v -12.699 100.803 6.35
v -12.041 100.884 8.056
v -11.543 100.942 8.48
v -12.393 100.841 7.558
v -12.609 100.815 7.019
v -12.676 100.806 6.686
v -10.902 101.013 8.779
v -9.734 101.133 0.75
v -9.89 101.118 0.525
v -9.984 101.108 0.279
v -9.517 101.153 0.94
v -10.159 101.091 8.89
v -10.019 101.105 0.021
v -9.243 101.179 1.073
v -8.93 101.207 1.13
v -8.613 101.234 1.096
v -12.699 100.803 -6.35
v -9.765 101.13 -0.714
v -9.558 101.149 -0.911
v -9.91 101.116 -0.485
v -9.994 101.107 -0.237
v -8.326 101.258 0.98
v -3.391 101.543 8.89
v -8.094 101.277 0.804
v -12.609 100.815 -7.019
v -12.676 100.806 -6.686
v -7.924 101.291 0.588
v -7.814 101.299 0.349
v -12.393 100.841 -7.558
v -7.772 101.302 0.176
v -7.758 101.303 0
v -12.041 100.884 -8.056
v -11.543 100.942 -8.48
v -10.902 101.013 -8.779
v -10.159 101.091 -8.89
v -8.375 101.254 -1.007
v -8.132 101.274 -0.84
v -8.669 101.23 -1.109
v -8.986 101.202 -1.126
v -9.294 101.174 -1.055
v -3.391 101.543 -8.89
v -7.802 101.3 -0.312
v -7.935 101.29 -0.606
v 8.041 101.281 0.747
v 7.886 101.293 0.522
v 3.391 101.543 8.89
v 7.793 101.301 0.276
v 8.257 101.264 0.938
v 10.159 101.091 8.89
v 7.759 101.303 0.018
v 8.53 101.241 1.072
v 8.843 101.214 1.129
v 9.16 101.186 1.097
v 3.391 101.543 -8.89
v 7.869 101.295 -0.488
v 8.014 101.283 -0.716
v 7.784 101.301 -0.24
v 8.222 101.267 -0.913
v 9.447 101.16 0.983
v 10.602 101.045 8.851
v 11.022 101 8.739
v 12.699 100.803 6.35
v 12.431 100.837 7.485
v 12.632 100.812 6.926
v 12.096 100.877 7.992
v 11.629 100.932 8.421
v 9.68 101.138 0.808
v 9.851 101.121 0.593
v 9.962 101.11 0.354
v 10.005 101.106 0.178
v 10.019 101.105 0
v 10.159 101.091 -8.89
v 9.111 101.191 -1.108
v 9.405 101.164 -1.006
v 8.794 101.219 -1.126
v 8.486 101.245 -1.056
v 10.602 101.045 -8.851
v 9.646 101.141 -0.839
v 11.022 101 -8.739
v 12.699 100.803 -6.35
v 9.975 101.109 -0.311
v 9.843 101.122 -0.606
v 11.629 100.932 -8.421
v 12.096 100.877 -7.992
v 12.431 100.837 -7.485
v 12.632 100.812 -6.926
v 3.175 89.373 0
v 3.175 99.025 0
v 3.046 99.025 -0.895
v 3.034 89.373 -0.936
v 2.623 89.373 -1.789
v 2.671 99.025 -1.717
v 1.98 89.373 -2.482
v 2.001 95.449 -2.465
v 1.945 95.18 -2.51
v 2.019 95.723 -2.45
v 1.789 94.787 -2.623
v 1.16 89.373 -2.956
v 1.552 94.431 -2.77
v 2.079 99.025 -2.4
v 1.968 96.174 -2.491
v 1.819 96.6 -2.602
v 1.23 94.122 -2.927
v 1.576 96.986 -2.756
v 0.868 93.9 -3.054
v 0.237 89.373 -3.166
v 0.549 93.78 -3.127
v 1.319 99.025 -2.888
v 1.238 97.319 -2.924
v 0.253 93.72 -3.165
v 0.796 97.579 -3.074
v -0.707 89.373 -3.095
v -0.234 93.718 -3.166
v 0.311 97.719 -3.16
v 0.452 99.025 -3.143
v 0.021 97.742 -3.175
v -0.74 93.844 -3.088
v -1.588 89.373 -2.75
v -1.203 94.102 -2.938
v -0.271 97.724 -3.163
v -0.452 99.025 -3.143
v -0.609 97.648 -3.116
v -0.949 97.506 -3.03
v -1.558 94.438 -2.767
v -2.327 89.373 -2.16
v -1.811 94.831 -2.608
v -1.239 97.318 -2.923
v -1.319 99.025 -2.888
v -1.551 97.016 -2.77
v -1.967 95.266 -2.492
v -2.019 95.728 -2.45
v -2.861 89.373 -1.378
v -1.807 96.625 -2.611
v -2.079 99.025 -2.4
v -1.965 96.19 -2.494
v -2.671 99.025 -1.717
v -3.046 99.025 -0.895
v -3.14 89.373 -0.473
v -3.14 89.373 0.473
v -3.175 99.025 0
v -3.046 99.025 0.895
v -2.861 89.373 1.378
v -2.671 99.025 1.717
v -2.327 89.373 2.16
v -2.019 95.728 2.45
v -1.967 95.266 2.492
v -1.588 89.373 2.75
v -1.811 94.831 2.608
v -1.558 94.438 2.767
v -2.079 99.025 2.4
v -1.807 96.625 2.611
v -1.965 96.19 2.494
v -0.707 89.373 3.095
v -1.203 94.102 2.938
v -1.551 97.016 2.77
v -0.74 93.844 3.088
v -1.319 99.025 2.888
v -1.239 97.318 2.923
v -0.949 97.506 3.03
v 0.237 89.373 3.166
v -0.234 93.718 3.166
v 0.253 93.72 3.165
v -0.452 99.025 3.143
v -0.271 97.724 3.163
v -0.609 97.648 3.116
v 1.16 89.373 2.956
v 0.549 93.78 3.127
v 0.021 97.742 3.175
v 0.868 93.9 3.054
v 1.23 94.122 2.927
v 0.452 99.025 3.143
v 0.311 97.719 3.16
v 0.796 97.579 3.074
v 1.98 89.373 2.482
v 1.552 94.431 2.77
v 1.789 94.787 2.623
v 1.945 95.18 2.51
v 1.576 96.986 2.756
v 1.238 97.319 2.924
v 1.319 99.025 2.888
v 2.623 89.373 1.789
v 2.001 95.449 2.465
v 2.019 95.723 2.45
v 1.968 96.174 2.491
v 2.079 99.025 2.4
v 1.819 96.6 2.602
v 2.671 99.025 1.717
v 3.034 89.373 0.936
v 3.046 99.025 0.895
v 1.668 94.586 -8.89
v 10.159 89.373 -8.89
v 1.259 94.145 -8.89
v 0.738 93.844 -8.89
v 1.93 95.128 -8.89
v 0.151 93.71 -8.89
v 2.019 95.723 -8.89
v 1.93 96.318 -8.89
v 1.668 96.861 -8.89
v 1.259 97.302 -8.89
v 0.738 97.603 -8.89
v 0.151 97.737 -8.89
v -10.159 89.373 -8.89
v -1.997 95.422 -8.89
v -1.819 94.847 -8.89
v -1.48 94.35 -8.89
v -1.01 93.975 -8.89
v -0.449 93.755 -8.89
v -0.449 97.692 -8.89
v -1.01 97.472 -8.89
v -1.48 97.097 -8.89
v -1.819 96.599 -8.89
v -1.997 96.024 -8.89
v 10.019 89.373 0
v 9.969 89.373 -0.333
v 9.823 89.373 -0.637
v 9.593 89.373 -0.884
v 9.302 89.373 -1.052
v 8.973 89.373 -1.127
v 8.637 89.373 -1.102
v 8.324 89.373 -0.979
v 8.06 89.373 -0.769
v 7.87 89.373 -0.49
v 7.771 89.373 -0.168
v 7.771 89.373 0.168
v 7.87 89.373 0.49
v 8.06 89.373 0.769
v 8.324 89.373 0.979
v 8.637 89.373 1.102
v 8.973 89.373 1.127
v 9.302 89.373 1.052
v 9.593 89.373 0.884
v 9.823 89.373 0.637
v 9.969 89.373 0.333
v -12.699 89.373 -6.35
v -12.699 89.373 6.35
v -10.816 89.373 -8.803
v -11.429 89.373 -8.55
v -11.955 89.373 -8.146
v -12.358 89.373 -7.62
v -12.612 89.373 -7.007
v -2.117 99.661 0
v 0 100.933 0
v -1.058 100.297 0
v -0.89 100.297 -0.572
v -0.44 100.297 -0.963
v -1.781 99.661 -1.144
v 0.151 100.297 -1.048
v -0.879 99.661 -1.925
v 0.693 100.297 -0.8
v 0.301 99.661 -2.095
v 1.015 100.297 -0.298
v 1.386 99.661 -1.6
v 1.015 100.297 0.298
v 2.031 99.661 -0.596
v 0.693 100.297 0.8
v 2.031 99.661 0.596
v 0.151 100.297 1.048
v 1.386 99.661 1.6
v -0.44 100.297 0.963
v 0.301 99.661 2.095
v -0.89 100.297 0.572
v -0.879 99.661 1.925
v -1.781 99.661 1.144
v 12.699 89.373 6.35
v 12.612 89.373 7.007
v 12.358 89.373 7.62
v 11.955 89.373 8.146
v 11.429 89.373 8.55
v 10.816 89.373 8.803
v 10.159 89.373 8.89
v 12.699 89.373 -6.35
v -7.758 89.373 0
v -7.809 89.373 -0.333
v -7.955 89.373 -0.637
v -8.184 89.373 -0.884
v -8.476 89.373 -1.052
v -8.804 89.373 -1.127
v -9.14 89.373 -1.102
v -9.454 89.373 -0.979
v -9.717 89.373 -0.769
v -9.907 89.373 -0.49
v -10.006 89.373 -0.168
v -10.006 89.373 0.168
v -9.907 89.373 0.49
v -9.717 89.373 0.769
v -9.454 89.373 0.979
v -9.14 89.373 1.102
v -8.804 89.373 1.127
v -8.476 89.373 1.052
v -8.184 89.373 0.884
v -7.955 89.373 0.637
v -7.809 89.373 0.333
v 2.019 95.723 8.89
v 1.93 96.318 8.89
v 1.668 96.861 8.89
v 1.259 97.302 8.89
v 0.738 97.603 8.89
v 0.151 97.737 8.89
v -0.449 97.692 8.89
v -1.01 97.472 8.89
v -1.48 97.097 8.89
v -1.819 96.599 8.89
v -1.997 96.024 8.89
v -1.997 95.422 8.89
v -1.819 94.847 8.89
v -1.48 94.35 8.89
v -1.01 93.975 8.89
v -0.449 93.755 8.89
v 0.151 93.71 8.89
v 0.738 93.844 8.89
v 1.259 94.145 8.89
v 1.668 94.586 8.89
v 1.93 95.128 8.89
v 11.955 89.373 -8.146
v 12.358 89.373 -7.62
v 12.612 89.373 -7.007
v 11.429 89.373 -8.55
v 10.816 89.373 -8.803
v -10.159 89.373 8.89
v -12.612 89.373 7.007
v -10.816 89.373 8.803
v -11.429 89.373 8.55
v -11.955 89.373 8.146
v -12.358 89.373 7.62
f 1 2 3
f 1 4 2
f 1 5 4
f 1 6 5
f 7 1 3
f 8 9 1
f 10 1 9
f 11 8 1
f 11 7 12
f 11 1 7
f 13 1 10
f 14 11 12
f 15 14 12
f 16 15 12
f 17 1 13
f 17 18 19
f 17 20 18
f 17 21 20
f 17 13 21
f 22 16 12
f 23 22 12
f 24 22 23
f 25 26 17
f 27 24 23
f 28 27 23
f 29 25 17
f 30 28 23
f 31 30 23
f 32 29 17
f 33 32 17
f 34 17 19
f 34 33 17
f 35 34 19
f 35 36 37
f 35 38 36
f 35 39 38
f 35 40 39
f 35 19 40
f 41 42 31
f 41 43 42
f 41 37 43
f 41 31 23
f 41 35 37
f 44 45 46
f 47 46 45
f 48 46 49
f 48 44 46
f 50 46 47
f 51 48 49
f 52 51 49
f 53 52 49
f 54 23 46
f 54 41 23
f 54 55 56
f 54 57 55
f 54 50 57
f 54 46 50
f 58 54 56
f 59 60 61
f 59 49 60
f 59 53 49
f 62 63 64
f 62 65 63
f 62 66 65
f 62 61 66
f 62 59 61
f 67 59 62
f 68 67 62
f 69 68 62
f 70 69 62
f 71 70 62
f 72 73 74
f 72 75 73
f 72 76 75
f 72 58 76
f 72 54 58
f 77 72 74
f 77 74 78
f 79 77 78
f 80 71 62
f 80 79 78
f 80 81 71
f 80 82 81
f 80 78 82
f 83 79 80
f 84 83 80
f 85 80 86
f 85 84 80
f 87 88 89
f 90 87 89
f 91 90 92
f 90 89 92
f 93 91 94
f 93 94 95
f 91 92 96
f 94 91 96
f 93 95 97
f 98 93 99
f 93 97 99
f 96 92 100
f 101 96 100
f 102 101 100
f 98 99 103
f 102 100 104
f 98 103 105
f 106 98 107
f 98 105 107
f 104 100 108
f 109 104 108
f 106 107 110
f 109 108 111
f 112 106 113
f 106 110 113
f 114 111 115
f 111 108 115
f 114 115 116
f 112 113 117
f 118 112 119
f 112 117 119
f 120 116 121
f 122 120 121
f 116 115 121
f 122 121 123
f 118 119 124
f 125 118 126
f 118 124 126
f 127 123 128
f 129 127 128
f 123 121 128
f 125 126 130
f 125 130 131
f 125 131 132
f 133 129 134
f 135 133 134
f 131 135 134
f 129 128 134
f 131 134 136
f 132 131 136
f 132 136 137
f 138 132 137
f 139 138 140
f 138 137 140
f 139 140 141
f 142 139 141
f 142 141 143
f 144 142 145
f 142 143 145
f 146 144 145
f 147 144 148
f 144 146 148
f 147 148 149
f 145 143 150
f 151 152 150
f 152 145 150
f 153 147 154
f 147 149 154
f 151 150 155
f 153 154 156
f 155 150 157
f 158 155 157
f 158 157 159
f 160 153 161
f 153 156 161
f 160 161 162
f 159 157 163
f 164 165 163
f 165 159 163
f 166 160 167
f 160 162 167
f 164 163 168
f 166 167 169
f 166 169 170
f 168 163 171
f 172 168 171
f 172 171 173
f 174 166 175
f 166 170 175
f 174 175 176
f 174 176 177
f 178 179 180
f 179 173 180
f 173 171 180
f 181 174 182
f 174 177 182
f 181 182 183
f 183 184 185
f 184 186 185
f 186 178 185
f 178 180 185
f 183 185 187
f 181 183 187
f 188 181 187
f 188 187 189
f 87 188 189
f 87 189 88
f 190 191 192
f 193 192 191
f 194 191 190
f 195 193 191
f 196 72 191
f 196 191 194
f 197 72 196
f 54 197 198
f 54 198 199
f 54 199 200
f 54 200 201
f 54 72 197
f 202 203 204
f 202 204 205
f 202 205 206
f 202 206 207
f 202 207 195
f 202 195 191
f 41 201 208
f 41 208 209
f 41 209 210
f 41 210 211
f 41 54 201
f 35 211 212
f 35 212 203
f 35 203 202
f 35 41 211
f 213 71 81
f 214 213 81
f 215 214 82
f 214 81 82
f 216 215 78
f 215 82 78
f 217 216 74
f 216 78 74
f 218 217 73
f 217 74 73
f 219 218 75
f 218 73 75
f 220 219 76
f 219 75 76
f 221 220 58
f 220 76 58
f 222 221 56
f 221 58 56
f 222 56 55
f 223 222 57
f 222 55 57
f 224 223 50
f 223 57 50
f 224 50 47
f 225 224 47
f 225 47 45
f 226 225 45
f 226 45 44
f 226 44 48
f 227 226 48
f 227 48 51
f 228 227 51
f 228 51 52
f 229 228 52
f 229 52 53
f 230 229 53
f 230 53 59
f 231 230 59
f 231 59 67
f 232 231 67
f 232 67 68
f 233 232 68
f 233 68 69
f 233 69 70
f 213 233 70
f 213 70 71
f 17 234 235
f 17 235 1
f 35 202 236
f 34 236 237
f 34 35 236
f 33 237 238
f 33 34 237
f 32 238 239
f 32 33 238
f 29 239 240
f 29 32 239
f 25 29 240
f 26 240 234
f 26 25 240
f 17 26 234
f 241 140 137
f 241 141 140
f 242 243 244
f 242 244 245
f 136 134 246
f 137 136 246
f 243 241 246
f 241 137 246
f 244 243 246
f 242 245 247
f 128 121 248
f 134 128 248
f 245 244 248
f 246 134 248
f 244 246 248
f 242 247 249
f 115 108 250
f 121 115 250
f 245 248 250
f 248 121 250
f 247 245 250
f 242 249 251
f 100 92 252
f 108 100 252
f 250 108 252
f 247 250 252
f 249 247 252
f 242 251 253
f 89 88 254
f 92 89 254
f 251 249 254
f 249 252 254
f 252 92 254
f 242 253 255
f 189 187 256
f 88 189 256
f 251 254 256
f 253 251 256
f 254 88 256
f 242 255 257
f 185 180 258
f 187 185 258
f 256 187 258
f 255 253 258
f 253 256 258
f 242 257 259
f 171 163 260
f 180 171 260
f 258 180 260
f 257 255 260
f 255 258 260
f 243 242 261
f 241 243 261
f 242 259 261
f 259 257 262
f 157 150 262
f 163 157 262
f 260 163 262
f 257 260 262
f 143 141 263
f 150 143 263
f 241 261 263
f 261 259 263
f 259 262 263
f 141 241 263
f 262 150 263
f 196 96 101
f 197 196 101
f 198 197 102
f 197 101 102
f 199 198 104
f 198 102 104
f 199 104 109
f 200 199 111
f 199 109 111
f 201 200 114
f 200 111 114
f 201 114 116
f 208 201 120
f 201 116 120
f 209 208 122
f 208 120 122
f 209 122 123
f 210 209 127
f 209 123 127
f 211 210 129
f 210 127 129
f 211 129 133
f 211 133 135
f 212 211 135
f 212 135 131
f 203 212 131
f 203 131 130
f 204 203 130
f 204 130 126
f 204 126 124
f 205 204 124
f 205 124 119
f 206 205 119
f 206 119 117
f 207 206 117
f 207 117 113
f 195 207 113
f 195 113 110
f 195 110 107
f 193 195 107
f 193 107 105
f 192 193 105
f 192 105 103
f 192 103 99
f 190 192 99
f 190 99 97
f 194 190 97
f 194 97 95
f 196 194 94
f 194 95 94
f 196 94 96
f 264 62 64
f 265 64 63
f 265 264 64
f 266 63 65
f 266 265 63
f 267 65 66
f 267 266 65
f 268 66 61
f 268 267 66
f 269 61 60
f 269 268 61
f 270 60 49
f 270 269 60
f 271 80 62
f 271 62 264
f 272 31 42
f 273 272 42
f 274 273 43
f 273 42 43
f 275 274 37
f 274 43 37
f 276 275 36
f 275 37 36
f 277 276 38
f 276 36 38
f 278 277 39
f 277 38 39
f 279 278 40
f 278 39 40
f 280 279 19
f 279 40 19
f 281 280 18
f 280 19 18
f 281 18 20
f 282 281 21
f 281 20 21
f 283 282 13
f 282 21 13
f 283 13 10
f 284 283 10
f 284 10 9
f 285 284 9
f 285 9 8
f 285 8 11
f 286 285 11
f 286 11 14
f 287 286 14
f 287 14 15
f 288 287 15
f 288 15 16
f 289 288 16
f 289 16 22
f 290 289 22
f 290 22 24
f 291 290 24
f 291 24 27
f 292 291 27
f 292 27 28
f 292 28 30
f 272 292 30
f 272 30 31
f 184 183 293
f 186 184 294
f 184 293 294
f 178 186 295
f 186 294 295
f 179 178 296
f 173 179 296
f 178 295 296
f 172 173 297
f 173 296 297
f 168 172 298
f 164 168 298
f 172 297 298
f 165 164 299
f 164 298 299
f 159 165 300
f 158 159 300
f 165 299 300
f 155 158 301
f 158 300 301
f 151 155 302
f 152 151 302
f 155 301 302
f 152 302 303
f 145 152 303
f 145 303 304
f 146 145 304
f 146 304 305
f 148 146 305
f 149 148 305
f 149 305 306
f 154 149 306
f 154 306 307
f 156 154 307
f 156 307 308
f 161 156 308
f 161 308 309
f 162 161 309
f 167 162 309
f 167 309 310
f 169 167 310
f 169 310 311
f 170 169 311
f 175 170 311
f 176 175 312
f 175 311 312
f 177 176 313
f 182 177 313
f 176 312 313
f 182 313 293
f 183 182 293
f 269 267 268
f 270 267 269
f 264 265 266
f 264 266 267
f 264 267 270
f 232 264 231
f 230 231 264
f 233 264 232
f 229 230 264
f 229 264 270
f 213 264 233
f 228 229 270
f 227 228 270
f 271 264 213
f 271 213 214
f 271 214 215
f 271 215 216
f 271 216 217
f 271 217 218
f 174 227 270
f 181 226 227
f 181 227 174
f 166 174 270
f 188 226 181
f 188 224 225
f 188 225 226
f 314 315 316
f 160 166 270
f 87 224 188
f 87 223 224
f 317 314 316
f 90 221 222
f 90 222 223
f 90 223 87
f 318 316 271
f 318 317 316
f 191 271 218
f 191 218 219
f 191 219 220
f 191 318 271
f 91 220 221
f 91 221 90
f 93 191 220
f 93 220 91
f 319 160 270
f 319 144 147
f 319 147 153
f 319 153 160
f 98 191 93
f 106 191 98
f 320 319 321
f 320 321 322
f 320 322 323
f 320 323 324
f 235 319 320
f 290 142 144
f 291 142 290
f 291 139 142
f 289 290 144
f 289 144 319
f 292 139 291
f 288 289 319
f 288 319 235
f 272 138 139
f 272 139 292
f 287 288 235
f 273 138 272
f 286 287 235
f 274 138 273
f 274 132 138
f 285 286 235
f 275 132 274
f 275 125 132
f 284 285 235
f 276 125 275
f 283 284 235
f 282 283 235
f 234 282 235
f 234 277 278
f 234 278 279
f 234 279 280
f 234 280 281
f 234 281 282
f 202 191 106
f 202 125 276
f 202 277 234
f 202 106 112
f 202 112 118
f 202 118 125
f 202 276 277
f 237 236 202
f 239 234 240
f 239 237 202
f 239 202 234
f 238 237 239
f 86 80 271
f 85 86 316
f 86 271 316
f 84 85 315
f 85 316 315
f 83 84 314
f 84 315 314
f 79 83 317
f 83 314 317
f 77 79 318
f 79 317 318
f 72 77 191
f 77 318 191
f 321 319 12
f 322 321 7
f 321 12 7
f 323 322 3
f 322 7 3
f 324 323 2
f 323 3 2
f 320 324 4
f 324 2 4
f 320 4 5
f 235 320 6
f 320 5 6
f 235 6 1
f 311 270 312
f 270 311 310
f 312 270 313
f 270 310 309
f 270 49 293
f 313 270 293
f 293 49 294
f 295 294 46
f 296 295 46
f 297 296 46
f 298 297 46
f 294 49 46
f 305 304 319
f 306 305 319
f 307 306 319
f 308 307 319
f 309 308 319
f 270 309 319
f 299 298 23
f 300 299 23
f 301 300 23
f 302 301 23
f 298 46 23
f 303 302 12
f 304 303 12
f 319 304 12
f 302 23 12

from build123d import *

# Parameters (mm, degrees)
BOSS_EXTRUDE1_DEPTH             = 8.89
BOSS_EXTRUDE1_DEPTH_BACK        = 8.89
F_1_4_0_25_DIAMETER_SLOT1_D     = 6.35
F_1_4_0_25_DIAMETER_SLOT1_DEPTH = 9.652
F_1_4_0_25_DIAMETER_SLOT1_TIP   = 1.907732465
TAP_DRILL_FOR_4_40_TAP2_D       = 2.2606
FILLET1_R                       = 2.54
F_10_32_TAPPED_HOLE1_D          = 4.0386


with BuildPart() as part:
    # Sketch1 → Boss-Extrude1 (new, two sides: drawn at the far end of the back side and taken through both)
    with BuildSketch(Plane.XY.offset(-BOSS_EXTRUDE1_DEPTH_BACK)):
        with BuildLine():
            Line((12.698670317, 100.803292467), (12.698670317, 89.373292467))
            Line((12.698670317, 89.373292467), (-12.698670317, 89.373292467))
            Line((-12.698670317, 89.373292467), (-12.698670317, 100.803292467))
            ThreePointArc((-12.698670317, 100.803292467), (0, 101.6), (12.698670317, 100.803292467))
        make_face()
    extrude(amount=BOSS_EXTRUDE1_DEPTH + BOSS_EXTRUDE1_DEPTH_BACK)

    # 1/4 (0.25) Diameter Slot1
    with Locations(Plane(origin=(0, 89.373292467, 0), x_dir=(-1, 0, 0), z_dir=(0, -1, 0))):
        with Locations((0, 0)):
            Hole(F_1_4_0_25_DIAMETER_SLOT1_D / 2, depth=F_1_4_0_25_DIAMETER_SLOT1_DEPTH)
            with Locations((0, 0, -(F_1_4_0_25_DIAMETER_SLOT1_DEPTH + F_1_4_0_25_DIAMETER_SLOT1_TIP / 2))):  # 118° drill point
                Cone(0, F_1_4_0_25_DIAMETER_SLOT1_D / 2, F_1_4_0_25_DIAMETER_SLOT1_TIP, mode=Mode.SUBTRACT)

    # Tap Drill for #4-40 Tap2 (through all)
    with Locations(Plane(origin=(0, 89.373292467, 0), x_dir=(-1, 0, 0), z_dir=(0, -1, 0))):
        with Locations((8.888670317, 0), (-8.888670317, 0)):
            Hole(TAP_DRILL_FOR_4_40_TAP2_D / 2)

    # Fillet1
    fillet1_edges = [part.edges().sort_by_distance(p)[0] for p in [
        (12.698670317, 95.088292467, -8.89),
        (-12.698670317, 95.088292467, 8.89),
        (12.698670317, 95.088292467, 8.89),
        (-12.698670317, 95.088292467, -8.89),
    ]]
    fillet(fillet1_edges, radius=FILLET1_R)

    # #10-32 Tapped Hole1 (through all)
    with Locations(Plane(origin=(0, 0, -8.89), x_dir=(-1, 0, 0), z_dir=(0, 0, -1))):
        with Locations((0, 95.723292467)):
            Hole(F_10_32_TAPPED_HOLE1_D / 2)


solid = part.part
